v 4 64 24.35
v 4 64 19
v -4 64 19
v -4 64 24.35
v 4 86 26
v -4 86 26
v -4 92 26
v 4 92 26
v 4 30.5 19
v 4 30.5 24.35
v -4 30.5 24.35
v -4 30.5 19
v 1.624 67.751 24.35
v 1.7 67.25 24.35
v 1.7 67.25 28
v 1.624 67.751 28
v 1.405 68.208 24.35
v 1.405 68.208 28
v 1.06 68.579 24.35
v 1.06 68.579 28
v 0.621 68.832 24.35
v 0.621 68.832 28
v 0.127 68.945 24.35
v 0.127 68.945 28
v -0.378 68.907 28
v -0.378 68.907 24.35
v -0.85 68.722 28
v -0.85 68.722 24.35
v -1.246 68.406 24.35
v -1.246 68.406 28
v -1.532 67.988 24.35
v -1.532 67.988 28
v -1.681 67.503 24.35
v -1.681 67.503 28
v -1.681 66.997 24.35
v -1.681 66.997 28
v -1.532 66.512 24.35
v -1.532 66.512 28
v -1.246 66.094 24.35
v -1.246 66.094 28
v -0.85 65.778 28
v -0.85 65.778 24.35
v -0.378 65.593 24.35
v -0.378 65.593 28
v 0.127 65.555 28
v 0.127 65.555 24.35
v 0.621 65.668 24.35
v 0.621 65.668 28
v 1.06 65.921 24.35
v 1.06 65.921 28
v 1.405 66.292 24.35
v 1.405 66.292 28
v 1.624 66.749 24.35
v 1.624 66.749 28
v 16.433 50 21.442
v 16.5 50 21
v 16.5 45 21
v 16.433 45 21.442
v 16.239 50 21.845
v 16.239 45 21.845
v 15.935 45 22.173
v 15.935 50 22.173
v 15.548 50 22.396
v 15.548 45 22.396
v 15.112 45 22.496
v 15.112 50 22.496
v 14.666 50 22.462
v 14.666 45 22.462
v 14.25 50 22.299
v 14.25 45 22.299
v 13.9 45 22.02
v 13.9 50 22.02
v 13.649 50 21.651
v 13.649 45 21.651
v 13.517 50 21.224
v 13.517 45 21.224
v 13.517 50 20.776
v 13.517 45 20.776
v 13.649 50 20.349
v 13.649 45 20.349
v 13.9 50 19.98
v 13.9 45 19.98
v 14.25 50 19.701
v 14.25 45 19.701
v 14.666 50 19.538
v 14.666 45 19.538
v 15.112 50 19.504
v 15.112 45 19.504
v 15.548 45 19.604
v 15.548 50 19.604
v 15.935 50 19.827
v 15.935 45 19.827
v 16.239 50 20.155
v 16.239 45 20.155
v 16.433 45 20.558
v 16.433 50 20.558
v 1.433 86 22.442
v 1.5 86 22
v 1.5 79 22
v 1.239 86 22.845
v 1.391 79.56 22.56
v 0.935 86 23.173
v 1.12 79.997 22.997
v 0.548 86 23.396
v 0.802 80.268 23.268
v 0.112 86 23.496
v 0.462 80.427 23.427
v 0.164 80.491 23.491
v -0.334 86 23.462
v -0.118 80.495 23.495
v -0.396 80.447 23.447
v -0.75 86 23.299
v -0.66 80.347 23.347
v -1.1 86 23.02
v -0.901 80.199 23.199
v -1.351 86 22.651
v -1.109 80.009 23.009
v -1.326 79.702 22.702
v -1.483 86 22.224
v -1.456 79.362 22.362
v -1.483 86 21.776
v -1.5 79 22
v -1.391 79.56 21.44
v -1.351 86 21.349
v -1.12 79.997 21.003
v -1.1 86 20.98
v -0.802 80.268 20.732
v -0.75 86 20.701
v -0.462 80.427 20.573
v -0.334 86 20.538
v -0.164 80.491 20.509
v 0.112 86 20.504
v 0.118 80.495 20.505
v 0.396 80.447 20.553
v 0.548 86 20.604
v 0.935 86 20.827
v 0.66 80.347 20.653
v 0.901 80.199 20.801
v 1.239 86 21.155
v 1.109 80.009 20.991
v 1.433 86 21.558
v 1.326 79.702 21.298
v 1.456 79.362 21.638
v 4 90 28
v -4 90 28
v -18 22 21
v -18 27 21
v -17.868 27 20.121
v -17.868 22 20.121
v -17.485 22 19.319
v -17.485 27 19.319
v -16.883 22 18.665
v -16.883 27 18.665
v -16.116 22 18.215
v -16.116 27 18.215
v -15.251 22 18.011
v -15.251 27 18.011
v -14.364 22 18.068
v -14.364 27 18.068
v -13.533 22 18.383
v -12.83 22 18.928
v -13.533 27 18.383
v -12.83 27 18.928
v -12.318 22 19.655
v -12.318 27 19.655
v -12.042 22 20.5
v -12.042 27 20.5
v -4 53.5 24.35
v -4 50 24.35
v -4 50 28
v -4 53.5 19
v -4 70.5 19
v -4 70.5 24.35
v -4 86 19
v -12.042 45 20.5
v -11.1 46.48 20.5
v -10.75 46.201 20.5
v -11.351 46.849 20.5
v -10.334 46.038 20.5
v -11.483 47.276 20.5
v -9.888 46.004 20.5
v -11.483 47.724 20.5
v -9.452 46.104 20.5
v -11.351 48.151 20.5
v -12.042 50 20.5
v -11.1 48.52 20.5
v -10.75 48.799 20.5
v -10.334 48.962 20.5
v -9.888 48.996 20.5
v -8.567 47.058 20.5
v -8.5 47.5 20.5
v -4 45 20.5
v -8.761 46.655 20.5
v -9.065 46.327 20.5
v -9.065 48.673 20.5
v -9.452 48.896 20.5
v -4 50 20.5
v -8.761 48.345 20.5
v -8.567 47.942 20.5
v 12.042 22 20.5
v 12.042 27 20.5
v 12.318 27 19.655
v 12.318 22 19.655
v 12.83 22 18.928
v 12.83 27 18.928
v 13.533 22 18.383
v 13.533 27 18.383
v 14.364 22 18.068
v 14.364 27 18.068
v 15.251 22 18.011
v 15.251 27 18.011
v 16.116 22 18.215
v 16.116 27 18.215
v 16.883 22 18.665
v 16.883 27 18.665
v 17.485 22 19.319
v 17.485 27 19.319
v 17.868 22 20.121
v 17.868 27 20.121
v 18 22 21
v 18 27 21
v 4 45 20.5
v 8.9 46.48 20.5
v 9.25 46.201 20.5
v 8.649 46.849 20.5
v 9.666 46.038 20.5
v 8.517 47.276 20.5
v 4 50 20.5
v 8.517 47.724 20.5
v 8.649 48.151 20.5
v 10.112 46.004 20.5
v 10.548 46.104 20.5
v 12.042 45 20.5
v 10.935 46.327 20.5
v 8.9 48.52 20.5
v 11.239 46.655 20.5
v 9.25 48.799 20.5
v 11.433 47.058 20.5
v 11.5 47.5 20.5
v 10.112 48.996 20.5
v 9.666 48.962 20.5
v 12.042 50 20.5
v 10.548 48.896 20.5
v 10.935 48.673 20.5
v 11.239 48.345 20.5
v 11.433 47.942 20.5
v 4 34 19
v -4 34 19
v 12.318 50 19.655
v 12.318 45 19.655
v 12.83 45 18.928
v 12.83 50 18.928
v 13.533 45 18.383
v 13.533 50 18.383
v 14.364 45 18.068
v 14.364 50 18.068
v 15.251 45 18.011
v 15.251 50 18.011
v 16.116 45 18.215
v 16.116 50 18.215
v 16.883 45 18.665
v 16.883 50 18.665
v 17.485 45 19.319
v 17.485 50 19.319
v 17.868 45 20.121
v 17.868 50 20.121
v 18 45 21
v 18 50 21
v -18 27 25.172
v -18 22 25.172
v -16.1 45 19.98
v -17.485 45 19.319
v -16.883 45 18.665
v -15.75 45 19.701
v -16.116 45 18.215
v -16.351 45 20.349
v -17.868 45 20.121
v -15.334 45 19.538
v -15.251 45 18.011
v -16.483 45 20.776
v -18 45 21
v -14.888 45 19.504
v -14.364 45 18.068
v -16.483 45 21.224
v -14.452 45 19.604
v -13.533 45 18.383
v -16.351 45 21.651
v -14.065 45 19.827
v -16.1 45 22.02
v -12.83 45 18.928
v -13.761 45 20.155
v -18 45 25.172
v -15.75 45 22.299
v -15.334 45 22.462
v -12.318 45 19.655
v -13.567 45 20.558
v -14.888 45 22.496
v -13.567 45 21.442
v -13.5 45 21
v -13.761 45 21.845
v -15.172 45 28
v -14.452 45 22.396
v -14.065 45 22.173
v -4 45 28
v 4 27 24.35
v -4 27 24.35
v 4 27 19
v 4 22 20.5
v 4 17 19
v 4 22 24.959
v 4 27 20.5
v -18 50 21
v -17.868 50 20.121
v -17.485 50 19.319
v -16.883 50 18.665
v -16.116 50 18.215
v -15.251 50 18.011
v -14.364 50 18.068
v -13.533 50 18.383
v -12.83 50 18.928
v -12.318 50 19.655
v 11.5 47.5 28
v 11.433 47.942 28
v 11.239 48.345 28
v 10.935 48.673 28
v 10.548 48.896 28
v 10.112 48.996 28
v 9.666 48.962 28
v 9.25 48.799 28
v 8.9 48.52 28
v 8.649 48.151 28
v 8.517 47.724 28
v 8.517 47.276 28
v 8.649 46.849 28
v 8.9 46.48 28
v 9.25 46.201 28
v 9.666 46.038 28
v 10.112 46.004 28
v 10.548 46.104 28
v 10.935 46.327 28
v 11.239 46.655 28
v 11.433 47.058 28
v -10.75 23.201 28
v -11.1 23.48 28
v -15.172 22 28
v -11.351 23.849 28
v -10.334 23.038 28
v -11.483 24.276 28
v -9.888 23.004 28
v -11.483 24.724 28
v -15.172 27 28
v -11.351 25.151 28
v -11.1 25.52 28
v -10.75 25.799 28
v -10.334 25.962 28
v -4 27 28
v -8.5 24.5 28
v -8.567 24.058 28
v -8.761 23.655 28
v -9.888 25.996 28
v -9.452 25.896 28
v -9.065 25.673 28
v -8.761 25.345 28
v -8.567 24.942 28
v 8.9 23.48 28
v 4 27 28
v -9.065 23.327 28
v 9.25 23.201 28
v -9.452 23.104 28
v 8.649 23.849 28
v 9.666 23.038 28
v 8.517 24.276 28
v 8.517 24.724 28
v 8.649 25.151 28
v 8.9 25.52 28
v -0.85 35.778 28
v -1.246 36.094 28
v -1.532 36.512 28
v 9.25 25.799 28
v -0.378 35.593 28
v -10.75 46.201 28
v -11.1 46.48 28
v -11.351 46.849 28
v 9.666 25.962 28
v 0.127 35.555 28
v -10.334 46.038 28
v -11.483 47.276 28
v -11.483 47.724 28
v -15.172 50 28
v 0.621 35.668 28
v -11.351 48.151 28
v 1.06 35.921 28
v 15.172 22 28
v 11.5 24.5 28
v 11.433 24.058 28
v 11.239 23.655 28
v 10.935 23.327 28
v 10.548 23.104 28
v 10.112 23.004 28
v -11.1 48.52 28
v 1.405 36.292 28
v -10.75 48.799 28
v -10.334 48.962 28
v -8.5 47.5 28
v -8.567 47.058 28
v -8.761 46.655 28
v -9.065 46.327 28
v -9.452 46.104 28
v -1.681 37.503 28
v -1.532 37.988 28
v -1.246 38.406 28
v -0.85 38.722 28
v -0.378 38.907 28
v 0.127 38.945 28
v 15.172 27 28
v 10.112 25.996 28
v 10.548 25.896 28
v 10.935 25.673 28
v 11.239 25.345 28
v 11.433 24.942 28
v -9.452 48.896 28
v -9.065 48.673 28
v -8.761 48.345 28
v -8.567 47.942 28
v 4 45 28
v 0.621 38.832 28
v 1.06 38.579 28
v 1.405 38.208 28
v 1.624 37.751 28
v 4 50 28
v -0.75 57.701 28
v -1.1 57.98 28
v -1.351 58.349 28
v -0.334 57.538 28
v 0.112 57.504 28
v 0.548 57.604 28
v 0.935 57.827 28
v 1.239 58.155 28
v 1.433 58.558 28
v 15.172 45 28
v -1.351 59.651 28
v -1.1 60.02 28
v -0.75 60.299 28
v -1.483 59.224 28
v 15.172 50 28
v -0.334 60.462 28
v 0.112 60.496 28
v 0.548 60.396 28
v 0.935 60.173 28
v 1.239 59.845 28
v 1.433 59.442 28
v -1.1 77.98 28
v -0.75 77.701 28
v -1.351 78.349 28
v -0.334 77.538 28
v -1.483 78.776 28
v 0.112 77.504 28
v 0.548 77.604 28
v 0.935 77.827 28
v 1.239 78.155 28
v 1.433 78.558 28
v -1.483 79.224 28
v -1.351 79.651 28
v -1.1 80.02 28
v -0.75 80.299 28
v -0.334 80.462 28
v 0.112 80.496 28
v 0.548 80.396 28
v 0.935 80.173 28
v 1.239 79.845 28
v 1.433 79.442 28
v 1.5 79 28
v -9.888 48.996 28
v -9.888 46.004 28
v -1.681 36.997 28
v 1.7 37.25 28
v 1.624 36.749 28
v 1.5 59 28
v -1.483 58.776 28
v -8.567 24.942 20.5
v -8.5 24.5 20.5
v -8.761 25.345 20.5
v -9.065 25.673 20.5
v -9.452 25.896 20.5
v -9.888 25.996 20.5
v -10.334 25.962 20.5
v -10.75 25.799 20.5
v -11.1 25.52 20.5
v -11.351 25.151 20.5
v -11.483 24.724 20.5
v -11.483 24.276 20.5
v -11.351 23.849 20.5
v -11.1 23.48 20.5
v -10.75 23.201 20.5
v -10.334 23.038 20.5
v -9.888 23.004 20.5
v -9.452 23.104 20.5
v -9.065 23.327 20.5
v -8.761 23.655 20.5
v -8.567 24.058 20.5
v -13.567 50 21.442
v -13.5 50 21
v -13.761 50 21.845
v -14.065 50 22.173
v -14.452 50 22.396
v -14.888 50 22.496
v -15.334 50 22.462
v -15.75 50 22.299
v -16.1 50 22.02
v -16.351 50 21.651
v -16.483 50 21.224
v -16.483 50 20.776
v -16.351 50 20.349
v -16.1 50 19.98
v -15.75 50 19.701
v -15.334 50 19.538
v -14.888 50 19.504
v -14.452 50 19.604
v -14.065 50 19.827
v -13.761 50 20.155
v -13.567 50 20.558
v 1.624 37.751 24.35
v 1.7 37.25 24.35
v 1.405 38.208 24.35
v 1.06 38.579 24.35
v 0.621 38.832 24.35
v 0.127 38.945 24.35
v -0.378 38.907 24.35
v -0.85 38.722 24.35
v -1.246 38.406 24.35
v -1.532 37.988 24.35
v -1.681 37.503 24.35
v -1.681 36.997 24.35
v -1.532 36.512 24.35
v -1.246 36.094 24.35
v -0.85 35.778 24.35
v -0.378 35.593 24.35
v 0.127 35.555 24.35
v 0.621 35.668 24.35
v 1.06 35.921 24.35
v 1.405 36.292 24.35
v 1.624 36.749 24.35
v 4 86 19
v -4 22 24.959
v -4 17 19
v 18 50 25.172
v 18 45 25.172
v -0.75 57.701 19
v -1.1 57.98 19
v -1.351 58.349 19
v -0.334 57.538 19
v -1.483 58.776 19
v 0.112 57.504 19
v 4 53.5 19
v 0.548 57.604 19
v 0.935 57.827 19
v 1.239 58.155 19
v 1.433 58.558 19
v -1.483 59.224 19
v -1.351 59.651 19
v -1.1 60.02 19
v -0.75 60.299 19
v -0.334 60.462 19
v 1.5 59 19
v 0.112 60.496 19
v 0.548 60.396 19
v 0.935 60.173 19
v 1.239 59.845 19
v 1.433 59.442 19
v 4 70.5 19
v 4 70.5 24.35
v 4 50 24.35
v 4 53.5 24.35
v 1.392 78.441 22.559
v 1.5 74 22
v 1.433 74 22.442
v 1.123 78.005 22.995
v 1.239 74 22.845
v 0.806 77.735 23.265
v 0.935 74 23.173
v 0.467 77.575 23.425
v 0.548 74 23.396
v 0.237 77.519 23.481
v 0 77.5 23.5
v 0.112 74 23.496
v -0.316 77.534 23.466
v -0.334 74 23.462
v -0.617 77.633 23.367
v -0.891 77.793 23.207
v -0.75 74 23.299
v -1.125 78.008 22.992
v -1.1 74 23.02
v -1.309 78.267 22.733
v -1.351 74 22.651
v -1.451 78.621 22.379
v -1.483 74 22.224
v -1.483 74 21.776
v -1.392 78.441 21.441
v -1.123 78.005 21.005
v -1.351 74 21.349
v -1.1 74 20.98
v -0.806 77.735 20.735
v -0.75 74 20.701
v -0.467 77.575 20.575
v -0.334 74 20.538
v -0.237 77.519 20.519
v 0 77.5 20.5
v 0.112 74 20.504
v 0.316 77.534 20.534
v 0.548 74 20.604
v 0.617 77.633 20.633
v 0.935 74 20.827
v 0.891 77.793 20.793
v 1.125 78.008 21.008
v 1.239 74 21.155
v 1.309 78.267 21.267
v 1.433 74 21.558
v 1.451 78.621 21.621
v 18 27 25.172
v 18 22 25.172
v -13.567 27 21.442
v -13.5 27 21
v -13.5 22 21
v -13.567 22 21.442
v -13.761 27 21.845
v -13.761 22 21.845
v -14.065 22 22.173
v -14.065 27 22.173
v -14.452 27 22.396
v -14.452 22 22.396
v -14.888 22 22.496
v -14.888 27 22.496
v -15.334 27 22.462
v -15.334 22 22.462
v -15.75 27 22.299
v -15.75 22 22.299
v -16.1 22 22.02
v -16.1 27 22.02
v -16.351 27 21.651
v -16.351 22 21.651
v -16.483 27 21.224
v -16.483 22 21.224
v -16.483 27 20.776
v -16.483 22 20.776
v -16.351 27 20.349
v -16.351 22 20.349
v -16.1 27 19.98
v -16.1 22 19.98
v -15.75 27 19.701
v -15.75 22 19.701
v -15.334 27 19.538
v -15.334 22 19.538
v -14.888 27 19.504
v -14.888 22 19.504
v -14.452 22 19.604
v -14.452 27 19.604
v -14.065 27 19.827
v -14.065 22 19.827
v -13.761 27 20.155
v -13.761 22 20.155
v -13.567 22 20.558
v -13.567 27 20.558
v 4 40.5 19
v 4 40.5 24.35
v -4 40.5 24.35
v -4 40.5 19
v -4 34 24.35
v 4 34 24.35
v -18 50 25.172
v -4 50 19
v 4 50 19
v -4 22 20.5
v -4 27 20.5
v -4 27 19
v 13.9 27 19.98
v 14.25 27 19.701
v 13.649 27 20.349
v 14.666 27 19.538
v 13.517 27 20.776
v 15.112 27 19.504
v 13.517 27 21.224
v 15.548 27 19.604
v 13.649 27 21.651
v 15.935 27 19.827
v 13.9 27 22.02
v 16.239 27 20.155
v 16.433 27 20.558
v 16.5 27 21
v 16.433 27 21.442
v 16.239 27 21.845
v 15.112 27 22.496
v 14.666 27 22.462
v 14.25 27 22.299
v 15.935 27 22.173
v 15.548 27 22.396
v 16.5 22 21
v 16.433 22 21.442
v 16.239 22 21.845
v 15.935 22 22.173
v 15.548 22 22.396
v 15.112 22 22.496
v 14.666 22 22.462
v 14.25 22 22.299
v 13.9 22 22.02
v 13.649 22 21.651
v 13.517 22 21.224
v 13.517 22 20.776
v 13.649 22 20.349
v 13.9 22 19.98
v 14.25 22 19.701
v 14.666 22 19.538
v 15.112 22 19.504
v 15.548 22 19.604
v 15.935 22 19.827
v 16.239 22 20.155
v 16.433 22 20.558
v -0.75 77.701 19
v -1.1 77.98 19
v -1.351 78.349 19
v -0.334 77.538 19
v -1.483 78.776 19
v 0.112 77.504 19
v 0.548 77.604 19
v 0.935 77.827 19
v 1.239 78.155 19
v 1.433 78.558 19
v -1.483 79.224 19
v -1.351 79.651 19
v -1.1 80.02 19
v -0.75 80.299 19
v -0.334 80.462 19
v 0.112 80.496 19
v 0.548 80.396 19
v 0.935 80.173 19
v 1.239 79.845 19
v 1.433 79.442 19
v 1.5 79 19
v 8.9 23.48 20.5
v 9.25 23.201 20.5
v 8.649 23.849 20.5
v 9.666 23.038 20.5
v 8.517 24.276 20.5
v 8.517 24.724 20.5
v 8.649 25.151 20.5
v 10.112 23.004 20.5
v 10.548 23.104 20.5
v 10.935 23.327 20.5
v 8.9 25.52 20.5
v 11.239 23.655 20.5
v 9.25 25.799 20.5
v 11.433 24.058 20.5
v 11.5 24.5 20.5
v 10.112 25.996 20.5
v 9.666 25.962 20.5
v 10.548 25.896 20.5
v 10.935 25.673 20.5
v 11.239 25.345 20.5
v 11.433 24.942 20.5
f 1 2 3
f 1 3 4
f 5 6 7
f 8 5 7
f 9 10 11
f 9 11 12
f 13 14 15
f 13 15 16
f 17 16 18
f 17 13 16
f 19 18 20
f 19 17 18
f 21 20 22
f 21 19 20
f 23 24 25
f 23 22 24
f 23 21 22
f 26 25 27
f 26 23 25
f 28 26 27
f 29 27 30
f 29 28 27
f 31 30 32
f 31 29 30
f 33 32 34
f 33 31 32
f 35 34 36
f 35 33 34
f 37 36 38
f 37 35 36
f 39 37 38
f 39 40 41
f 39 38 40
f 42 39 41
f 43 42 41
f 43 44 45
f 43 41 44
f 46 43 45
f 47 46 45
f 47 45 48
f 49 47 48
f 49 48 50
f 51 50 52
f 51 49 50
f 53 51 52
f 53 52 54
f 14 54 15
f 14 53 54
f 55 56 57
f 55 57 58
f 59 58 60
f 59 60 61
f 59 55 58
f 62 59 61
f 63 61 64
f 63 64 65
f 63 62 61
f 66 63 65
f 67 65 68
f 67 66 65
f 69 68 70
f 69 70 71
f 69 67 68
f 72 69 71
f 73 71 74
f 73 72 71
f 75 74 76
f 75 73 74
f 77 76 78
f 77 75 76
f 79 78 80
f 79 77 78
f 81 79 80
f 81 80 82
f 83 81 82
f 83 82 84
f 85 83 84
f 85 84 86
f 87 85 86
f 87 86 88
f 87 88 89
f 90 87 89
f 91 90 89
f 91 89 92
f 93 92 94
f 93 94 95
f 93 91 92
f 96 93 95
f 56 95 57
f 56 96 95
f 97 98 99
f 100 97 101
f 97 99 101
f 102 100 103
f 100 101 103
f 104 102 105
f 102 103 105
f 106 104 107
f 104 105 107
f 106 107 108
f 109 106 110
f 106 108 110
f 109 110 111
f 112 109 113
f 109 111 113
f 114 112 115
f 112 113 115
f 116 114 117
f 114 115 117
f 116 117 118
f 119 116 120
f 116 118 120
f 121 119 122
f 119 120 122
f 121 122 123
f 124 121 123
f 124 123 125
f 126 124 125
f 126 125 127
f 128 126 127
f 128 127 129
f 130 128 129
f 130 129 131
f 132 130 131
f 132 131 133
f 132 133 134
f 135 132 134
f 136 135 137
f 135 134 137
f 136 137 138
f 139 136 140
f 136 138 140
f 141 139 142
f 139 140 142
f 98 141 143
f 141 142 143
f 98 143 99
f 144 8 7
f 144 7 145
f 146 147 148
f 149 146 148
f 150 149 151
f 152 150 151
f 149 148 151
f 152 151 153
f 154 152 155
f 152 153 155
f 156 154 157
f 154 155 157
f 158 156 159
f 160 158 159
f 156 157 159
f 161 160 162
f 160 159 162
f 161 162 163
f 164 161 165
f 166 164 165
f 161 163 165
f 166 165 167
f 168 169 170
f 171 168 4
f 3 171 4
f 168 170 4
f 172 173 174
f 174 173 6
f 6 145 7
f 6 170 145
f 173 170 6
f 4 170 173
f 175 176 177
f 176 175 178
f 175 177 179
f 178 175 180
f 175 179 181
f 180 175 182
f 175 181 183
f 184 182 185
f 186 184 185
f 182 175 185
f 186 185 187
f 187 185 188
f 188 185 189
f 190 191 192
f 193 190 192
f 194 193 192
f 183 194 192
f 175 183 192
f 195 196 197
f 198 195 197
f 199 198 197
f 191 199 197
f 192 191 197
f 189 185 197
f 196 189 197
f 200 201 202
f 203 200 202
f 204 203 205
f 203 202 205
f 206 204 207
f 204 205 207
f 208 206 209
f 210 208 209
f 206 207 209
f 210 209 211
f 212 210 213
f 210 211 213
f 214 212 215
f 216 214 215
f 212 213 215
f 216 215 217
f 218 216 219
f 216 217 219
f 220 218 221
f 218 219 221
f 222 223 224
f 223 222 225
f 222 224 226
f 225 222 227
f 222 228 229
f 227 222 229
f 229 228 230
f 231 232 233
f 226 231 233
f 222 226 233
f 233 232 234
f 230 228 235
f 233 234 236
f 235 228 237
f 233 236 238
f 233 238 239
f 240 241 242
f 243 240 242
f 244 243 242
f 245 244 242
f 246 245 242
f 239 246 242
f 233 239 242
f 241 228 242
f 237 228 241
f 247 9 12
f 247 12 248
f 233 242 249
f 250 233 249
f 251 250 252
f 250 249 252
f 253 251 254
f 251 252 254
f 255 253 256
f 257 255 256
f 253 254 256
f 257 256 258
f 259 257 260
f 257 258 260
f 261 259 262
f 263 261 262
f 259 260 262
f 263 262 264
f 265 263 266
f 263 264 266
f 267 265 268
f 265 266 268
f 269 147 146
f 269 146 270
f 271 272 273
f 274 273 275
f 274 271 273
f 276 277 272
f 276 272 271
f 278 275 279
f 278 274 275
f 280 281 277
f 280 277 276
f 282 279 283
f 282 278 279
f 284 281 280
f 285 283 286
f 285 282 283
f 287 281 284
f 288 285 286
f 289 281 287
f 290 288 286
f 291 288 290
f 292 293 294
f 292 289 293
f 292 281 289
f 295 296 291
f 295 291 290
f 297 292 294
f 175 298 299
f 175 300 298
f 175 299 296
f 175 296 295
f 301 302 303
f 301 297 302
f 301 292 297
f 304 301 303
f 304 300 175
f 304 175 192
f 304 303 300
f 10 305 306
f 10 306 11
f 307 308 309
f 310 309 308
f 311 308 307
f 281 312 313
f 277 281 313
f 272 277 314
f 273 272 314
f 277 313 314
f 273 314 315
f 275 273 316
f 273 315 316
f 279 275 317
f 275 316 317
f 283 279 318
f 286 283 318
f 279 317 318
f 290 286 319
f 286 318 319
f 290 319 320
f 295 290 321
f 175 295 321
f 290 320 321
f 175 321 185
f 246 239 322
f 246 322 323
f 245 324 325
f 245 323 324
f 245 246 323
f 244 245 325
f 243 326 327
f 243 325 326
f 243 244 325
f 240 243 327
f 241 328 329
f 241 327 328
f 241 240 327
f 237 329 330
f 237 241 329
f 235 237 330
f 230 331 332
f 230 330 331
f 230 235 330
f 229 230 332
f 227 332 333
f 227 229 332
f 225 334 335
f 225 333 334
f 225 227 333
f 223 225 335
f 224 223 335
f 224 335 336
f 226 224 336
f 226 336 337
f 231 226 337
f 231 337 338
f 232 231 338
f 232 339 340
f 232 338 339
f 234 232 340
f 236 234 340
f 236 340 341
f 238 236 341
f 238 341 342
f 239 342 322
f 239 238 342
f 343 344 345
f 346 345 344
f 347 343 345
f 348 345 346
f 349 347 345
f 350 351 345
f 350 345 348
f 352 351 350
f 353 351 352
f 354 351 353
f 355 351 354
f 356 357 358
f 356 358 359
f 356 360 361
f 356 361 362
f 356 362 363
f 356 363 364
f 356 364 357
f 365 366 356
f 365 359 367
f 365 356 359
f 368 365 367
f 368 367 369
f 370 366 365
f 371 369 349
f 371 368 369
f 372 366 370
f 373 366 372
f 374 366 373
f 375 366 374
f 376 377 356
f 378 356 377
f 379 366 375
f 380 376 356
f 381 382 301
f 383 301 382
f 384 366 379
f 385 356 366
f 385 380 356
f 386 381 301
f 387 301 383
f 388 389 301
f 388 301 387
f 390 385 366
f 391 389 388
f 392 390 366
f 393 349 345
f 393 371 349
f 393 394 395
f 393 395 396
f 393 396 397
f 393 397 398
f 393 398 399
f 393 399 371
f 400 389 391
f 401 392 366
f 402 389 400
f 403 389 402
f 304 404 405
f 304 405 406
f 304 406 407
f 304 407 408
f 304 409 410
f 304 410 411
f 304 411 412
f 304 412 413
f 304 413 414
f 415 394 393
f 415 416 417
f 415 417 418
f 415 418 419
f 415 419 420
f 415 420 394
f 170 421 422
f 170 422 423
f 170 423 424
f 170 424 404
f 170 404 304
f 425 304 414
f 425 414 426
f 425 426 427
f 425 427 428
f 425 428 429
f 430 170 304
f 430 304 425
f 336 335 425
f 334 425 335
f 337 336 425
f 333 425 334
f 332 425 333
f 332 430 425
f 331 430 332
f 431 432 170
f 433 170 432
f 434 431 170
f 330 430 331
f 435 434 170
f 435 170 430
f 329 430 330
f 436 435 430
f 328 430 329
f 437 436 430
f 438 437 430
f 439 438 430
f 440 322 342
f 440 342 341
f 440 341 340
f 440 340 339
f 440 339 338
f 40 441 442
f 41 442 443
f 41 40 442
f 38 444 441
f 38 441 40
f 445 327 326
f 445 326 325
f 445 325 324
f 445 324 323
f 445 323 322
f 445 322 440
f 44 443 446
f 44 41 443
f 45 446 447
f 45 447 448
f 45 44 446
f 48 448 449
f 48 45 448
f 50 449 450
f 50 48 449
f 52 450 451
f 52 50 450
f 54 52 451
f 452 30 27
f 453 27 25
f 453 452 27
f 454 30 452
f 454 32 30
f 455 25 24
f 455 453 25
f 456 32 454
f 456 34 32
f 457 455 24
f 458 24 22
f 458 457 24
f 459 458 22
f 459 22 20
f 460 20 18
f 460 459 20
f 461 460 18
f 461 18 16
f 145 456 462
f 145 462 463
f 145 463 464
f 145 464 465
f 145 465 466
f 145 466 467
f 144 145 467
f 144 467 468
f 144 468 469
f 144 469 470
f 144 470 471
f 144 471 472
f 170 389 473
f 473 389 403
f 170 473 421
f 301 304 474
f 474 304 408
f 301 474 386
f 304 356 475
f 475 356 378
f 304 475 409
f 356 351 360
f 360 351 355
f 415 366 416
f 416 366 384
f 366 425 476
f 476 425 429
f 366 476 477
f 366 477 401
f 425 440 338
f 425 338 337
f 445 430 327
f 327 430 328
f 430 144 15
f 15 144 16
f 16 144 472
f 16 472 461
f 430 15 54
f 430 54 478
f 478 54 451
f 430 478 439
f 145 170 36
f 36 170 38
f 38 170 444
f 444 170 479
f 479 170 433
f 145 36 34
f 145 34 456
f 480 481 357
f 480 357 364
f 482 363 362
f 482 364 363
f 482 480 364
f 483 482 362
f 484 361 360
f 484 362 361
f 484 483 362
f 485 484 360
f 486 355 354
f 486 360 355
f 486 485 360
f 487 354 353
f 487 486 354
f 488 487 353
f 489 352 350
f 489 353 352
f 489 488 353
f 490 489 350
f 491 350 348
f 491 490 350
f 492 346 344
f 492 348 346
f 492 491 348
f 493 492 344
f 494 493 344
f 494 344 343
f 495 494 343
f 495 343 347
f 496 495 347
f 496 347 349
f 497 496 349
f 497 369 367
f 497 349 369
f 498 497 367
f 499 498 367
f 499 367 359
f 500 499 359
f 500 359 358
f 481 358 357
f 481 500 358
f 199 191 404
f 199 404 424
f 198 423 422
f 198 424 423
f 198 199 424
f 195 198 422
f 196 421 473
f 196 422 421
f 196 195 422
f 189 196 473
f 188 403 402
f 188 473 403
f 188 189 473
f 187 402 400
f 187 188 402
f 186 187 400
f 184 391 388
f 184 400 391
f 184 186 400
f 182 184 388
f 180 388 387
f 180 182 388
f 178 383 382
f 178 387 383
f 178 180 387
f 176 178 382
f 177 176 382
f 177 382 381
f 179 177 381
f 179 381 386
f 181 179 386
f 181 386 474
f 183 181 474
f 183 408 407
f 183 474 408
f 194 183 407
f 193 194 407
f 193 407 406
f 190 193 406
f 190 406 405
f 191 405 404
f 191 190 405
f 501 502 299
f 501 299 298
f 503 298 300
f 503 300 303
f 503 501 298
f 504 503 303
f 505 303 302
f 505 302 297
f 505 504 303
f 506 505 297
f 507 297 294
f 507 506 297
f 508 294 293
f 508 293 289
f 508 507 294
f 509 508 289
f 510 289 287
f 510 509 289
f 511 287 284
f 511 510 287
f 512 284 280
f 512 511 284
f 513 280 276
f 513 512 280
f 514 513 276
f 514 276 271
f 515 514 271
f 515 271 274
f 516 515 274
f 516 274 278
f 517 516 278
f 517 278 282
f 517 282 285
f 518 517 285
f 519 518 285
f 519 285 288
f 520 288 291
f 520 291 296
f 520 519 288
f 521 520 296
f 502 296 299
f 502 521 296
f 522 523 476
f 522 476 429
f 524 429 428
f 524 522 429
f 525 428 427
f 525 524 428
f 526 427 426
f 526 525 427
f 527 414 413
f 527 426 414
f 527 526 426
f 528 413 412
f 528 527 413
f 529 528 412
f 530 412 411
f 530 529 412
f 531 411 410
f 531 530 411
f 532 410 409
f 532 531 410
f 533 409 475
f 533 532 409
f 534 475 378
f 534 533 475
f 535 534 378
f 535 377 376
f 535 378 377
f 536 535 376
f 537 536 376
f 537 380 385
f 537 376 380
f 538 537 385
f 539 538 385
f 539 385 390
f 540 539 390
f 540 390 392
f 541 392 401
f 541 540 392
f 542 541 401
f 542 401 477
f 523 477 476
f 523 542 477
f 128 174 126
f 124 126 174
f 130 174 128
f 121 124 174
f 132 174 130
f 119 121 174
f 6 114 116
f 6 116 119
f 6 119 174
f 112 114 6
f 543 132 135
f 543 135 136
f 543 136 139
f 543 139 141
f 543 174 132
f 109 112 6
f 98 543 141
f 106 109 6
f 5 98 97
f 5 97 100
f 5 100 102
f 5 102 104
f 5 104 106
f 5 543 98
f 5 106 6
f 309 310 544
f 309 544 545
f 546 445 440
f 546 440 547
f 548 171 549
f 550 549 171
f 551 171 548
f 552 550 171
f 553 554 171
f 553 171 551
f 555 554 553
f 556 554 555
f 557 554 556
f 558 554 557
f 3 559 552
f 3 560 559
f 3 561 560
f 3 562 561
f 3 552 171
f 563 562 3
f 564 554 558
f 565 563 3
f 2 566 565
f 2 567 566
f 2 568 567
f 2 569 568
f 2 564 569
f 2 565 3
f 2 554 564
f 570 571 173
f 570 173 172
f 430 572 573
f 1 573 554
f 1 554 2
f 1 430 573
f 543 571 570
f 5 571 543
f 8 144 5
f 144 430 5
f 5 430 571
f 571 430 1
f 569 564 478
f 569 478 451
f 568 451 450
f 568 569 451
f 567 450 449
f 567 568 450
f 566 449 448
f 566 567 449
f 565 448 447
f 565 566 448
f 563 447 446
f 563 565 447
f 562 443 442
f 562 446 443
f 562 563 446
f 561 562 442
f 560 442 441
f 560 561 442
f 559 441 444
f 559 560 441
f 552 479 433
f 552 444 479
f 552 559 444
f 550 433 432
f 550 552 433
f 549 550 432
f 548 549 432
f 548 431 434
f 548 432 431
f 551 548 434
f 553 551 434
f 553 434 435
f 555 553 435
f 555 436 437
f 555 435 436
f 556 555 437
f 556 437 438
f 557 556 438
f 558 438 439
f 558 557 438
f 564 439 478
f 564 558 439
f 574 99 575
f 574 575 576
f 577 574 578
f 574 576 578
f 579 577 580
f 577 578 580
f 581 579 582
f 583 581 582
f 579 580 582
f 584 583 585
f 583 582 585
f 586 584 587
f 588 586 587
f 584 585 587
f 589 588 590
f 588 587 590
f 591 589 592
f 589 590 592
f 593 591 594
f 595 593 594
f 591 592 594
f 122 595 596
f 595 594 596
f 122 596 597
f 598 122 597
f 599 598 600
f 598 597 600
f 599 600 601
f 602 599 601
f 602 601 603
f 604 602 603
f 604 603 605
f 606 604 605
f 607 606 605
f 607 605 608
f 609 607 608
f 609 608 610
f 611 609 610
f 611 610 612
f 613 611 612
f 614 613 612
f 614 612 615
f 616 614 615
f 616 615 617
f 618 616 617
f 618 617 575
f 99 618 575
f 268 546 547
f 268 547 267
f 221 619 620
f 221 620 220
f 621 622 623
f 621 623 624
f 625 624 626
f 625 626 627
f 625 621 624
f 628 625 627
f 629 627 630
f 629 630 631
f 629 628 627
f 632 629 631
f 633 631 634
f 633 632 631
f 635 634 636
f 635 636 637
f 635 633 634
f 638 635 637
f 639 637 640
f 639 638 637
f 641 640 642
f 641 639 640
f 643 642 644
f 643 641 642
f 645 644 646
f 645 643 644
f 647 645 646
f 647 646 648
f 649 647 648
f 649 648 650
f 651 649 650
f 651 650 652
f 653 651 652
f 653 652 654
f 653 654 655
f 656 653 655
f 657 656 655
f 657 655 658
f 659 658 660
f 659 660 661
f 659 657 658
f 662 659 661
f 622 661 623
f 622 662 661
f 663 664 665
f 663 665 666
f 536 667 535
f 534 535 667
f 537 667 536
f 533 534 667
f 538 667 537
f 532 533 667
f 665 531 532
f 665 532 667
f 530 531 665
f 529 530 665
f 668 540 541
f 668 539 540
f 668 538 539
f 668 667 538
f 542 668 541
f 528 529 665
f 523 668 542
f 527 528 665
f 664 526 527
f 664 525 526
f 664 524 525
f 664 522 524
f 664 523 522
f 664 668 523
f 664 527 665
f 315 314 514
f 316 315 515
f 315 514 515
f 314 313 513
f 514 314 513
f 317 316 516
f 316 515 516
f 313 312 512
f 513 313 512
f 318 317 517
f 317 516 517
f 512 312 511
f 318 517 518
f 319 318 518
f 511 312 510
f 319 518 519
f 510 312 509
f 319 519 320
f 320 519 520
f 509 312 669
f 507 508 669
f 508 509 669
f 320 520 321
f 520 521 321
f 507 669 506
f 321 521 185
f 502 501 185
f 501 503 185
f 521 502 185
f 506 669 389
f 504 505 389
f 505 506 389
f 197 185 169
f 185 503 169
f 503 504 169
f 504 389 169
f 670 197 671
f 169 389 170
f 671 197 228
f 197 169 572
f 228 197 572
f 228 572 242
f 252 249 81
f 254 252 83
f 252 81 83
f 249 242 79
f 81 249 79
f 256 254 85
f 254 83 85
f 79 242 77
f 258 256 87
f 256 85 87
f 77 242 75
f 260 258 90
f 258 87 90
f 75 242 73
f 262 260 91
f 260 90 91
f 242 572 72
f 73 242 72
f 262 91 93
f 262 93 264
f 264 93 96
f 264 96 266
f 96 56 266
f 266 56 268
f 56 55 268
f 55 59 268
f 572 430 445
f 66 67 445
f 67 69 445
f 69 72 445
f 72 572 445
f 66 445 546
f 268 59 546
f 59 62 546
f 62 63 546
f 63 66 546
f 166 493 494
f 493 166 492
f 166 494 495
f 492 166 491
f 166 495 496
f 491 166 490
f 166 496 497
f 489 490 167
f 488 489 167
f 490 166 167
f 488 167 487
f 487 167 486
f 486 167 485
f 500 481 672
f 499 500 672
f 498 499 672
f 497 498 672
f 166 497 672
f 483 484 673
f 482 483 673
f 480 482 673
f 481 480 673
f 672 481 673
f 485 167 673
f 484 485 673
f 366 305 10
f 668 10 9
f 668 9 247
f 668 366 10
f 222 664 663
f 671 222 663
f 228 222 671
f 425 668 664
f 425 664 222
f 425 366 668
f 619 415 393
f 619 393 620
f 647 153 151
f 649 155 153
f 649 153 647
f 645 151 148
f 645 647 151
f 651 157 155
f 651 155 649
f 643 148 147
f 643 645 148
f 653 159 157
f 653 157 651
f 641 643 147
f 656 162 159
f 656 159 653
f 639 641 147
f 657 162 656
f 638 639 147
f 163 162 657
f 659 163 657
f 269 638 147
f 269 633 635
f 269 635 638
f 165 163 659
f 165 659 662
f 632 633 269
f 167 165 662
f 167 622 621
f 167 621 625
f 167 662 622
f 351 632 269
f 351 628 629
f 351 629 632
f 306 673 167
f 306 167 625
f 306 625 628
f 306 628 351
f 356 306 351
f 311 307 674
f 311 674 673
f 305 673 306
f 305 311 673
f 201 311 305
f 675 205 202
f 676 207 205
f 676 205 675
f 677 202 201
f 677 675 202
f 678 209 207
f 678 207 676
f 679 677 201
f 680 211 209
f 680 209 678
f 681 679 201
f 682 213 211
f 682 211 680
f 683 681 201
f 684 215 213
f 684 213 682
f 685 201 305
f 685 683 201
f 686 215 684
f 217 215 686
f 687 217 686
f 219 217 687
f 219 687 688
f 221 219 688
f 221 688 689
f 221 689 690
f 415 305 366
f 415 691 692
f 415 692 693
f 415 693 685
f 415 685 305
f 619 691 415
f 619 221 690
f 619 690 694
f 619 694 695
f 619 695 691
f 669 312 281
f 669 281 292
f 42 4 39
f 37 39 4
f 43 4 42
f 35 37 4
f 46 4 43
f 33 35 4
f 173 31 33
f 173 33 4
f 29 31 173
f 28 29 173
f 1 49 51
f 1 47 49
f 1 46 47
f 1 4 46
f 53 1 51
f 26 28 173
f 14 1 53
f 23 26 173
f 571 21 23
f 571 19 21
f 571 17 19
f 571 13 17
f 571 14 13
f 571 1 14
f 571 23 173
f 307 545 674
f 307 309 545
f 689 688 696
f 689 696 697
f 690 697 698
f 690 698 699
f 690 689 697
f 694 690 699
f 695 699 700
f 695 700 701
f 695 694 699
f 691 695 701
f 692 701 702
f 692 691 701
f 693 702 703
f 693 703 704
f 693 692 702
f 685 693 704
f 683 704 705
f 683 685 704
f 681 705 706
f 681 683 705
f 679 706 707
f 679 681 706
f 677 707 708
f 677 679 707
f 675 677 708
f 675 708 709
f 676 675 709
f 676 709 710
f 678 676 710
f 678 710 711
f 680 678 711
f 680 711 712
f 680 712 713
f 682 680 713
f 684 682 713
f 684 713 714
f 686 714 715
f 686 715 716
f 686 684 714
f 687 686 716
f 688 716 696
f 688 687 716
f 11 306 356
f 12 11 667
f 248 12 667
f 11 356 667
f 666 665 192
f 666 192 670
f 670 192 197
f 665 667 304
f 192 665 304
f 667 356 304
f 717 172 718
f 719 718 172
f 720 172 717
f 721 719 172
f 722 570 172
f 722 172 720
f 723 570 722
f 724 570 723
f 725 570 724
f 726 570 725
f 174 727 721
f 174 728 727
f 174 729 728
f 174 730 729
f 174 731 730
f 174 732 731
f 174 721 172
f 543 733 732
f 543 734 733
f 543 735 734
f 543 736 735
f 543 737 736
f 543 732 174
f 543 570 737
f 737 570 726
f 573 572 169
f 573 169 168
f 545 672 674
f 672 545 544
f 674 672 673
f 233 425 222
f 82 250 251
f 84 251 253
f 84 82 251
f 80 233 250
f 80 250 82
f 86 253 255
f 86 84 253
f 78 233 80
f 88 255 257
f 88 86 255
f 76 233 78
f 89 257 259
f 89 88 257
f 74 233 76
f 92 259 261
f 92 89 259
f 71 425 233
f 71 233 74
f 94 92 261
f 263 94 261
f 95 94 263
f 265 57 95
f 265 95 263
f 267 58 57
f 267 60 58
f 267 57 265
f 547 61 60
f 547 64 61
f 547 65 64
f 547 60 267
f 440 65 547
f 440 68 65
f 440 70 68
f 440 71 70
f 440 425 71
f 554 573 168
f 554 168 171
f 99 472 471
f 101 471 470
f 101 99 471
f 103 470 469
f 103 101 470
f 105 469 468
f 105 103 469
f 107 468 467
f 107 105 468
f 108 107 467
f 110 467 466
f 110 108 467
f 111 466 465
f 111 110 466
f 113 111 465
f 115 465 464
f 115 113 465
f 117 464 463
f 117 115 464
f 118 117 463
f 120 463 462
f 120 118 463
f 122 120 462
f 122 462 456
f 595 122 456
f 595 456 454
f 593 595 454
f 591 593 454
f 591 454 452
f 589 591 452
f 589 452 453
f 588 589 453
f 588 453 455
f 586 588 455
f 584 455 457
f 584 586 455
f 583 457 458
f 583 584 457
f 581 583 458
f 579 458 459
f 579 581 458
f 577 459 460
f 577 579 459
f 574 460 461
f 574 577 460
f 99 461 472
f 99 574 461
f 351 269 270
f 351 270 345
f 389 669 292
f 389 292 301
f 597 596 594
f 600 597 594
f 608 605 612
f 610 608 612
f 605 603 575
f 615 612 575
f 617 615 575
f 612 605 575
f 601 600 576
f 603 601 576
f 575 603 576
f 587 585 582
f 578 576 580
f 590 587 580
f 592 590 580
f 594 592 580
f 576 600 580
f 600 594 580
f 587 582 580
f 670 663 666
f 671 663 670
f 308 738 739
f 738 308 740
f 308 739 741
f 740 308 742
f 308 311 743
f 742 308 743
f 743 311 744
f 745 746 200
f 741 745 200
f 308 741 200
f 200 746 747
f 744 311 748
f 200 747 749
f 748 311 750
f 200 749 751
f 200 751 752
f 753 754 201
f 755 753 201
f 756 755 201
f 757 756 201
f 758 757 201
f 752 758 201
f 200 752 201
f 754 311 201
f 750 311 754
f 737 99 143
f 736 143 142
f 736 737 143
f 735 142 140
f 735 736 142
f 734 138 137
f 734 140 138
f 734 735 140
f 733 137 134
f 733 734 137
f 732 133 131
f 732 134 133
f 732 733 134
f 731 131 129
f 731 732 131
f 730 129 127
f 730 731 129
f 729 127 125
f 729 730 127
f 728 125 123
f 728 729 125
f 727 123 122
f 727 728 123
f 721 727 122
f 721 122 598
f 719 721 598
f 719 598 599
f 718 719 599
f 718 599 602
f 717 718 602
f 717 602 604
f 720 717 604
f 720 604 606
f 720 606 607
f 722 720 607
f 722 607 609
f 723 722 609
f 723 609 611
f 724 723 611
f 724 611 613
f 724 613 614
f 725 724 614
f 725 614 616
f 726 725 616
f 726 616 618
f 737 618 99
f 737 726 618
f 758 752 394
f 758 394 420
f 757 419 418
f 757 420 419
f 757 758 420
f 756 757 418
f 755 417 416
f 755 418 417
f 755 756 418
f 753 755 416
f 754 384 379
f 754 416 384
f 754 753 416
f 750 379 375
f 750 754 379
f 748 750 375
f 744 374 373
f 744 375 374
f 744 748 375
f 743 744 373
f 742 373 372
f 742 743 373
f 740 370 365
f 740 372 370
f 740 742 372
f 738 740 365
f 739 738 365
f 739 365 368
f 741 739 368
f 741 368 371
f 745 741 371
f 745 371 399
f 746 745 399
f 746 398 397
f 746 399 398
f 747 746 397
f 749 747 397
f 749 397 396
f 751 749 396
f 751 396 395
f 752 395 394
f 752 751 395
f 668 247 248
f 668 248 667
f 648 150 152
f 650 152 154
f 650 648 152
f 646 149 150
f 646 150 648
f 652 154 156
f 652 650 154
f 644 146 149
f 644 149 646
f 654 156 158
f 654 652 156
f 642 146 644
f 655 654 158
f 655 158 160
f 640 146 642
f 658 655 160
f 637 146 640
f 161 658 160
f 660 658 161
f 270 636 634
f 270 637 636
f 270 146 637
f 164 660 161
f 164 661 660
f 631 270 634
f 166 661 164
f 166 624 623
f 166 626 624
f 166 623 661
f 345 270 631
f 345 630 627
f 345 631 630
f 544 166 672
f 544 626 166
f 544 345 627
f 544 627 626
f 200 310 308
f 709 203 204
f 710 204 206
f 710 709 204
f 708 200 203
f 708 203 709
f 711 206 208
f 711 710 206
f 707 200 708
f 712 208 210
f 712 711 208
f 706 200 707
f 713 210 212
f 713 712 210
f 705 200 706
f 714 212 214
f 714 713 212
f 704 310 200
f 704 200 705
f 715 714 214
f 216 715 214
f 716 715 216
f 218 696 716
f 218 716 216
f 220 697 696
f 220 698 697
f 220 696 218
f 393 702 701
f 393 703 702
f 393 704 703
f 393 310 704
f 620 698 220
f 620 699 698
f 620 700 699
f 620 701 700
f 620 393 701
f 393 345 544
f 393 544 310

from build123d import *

# Parameters (mm, degrees)
SKETCH128_R  = 1.5
PAD102_DEPTH = 50
SKETCH126_R  = 1.7
PAD100_DEPTH = 50
SKETCH124_R  = 1.7
PAD098_DEPTH = 50
SKETCH127_R  = 1.5
PAD101_DEPTH = 20
PAD078_DEPTH = 4
SKETCH109_R  = 1.5
PAD082_DEPTH = 5
SKETCH106_R  = 1.5
PAD077_DEPTH = 5


with BuildPart() as topscrewcutouts:
    # Sketch128 → Pad102 (new body)
    with BuildSketch(Plane.XY):
        with Locations((0, 79)):
            Circle(SKETCH128_R)
        with Locations((-10, 47.5)):
            Circle(SKETCH128_R)
        with Locations((10, 47.5)):
            Circle(SKETCH128_R)
        with Locations((-10, 24.5)):
            Circle(SKETCH128_R)
        with Locations((10, 24.5)):
            Circle(SKETCH128_R)
        with Locations((0, 59)):
            Circle(SKETCH128_R)
    extrude(amount=PAD102_DEPTH)


with BuildPart() as screwcutout:
    # Sketch126 → Pad100 (new body)
    with BuildSketch(Plane(origin=(0, 70, 0), x_dir=(1, 0, 0), z_dir=(0, 0, 1))):
        with Locations((0, -2.75)):
            Circle(SKETCH126_R)
    extrude(amount=PAD100_DEPTH)


with BuildPart() as pad098:
    # Sketch124 → Pad098 (new body)
    with BuildSketch(Plane(origin=(0, 40, 0), x_dir=(1, 0, 0), z_dir=(0, 0, 1))):
        with Locations((0, -2.75)):
            Circle(SKETCH124_R)
    extrude(amount=PAD098_DEPTH)


with BuildPart() as cutouts:
    # Sketch127 → Pad101 (new body)
    with BuildSketch(Plane.XZ.offset(-74)):
        with Locations((0, 22)):
            Circle(SKETCH127_R)
    extrude(amount=-PAD101_DEPTH)

    # Fusion004020004: union ScrewCutout, Pad098
    add(screwcutout.part)
    add(pad098.part)


with BuildPart() as mainspine:
    # Sketch102 → Pad078 (new body, symmetric)
    with BuildSketch(Plane.YZ):
        Polygon((17, 19), (27, 19), (27, 24.35), (30.5, 24.35), (30.5, 19), (34, 19), (34, 24.35), (40.5, 24.35), (40.5, 19), (50, 19), (50, 24.35), (53.5, 24.35), (53.5, 19), (64, 19), (64, 24.35), (70.5, 24.35), (70.5, 19), (86, 19), (86, 26), (92, 26), (90, 28), (24.551897, 28), align=None)
    extrude(amount=PAD078_DEPTH, both=True)


with BuildPart() as centermount:
    # Sketch109 → Pad082 (new body)
    with BuildSketch(Plane.XZ.offset(-50)):
        with BuildLine():
            Line((-12.04196, 20.5), (12.04196, 20.5))
            ThreePointArc((12.04196, 20.5), (15.250889, 18.010509), (18, 21.000021))
            Line((18, 25.171573), (18, 21.000021))
            Line((15.171573, 28), (18, 25.171573))
            Line((-15.171573, 28), (15.171573, 28))
            Line((-18, 25.171573), (-15.171573, 28))
            Line((-18, 21), (-18, 25.171573))
            ThreePointArc((-18, 21), (-15.250879, 18.010508), (-12.04196, 20.5))
        make_face()
        with Locations((15, 21)):
            Circle(SKETCH109_R, mode=Mode.SUBTRACT)
        with Locations((-15, 21)):
            Circle(SKETCH109_R, mode=Mode.SUBTRACT)
    extrude(amount=PAD082_DEPTH)


with BuildPart() as cut007019010:
    # Sketch106 → Pad077 (new body)
    with BuildSketch(Plane.XZ.offset(-27)):
        with BuildLine():
            Line((-12.04196, 20.5), (12.04196, 20.5))
            ThreePointArc((12.04196, 20.5), (15.250889, 18.010509), (18, 21.000021))
            Line((18, 25.171573), (18, 21.000021))
            Line((15.171573, 28), (18, 25.171573))
            Line((-15.171573, 28), (15.171573, 28))
            Line((-18, 25.171573), (-15.171573, 28))
            Line((-18, 21), (-18, 25.171573))
            ThreePointArc((-18, 21), (-15.250879, 18.010508), (-12.04196, 20.5))
        make_face()
        with Locations((15, 21)):
            Circle(SKETCH106_R, mode=Mode.SUBTRACT)
        with Locations((-15, 21)):
            Circle(SKETCH106_R, mode=Mode.SUBTRACT)
    extrude(amount=PAD077_DEPTH)

    # Fusion004020002: union MainSpine, CenterMount
    add(mainspine.part)
    add(centermount.part)

    # Cut007019009: cut Cutouts
    add(cutouts.part, mode=Mode.SUBTRACT)

    # Cut007019010: cut TopScrewCutouts
    add(topscrewcutouts.part, mode=Mode.SUBTRACT)


solid = cut007019010.part
